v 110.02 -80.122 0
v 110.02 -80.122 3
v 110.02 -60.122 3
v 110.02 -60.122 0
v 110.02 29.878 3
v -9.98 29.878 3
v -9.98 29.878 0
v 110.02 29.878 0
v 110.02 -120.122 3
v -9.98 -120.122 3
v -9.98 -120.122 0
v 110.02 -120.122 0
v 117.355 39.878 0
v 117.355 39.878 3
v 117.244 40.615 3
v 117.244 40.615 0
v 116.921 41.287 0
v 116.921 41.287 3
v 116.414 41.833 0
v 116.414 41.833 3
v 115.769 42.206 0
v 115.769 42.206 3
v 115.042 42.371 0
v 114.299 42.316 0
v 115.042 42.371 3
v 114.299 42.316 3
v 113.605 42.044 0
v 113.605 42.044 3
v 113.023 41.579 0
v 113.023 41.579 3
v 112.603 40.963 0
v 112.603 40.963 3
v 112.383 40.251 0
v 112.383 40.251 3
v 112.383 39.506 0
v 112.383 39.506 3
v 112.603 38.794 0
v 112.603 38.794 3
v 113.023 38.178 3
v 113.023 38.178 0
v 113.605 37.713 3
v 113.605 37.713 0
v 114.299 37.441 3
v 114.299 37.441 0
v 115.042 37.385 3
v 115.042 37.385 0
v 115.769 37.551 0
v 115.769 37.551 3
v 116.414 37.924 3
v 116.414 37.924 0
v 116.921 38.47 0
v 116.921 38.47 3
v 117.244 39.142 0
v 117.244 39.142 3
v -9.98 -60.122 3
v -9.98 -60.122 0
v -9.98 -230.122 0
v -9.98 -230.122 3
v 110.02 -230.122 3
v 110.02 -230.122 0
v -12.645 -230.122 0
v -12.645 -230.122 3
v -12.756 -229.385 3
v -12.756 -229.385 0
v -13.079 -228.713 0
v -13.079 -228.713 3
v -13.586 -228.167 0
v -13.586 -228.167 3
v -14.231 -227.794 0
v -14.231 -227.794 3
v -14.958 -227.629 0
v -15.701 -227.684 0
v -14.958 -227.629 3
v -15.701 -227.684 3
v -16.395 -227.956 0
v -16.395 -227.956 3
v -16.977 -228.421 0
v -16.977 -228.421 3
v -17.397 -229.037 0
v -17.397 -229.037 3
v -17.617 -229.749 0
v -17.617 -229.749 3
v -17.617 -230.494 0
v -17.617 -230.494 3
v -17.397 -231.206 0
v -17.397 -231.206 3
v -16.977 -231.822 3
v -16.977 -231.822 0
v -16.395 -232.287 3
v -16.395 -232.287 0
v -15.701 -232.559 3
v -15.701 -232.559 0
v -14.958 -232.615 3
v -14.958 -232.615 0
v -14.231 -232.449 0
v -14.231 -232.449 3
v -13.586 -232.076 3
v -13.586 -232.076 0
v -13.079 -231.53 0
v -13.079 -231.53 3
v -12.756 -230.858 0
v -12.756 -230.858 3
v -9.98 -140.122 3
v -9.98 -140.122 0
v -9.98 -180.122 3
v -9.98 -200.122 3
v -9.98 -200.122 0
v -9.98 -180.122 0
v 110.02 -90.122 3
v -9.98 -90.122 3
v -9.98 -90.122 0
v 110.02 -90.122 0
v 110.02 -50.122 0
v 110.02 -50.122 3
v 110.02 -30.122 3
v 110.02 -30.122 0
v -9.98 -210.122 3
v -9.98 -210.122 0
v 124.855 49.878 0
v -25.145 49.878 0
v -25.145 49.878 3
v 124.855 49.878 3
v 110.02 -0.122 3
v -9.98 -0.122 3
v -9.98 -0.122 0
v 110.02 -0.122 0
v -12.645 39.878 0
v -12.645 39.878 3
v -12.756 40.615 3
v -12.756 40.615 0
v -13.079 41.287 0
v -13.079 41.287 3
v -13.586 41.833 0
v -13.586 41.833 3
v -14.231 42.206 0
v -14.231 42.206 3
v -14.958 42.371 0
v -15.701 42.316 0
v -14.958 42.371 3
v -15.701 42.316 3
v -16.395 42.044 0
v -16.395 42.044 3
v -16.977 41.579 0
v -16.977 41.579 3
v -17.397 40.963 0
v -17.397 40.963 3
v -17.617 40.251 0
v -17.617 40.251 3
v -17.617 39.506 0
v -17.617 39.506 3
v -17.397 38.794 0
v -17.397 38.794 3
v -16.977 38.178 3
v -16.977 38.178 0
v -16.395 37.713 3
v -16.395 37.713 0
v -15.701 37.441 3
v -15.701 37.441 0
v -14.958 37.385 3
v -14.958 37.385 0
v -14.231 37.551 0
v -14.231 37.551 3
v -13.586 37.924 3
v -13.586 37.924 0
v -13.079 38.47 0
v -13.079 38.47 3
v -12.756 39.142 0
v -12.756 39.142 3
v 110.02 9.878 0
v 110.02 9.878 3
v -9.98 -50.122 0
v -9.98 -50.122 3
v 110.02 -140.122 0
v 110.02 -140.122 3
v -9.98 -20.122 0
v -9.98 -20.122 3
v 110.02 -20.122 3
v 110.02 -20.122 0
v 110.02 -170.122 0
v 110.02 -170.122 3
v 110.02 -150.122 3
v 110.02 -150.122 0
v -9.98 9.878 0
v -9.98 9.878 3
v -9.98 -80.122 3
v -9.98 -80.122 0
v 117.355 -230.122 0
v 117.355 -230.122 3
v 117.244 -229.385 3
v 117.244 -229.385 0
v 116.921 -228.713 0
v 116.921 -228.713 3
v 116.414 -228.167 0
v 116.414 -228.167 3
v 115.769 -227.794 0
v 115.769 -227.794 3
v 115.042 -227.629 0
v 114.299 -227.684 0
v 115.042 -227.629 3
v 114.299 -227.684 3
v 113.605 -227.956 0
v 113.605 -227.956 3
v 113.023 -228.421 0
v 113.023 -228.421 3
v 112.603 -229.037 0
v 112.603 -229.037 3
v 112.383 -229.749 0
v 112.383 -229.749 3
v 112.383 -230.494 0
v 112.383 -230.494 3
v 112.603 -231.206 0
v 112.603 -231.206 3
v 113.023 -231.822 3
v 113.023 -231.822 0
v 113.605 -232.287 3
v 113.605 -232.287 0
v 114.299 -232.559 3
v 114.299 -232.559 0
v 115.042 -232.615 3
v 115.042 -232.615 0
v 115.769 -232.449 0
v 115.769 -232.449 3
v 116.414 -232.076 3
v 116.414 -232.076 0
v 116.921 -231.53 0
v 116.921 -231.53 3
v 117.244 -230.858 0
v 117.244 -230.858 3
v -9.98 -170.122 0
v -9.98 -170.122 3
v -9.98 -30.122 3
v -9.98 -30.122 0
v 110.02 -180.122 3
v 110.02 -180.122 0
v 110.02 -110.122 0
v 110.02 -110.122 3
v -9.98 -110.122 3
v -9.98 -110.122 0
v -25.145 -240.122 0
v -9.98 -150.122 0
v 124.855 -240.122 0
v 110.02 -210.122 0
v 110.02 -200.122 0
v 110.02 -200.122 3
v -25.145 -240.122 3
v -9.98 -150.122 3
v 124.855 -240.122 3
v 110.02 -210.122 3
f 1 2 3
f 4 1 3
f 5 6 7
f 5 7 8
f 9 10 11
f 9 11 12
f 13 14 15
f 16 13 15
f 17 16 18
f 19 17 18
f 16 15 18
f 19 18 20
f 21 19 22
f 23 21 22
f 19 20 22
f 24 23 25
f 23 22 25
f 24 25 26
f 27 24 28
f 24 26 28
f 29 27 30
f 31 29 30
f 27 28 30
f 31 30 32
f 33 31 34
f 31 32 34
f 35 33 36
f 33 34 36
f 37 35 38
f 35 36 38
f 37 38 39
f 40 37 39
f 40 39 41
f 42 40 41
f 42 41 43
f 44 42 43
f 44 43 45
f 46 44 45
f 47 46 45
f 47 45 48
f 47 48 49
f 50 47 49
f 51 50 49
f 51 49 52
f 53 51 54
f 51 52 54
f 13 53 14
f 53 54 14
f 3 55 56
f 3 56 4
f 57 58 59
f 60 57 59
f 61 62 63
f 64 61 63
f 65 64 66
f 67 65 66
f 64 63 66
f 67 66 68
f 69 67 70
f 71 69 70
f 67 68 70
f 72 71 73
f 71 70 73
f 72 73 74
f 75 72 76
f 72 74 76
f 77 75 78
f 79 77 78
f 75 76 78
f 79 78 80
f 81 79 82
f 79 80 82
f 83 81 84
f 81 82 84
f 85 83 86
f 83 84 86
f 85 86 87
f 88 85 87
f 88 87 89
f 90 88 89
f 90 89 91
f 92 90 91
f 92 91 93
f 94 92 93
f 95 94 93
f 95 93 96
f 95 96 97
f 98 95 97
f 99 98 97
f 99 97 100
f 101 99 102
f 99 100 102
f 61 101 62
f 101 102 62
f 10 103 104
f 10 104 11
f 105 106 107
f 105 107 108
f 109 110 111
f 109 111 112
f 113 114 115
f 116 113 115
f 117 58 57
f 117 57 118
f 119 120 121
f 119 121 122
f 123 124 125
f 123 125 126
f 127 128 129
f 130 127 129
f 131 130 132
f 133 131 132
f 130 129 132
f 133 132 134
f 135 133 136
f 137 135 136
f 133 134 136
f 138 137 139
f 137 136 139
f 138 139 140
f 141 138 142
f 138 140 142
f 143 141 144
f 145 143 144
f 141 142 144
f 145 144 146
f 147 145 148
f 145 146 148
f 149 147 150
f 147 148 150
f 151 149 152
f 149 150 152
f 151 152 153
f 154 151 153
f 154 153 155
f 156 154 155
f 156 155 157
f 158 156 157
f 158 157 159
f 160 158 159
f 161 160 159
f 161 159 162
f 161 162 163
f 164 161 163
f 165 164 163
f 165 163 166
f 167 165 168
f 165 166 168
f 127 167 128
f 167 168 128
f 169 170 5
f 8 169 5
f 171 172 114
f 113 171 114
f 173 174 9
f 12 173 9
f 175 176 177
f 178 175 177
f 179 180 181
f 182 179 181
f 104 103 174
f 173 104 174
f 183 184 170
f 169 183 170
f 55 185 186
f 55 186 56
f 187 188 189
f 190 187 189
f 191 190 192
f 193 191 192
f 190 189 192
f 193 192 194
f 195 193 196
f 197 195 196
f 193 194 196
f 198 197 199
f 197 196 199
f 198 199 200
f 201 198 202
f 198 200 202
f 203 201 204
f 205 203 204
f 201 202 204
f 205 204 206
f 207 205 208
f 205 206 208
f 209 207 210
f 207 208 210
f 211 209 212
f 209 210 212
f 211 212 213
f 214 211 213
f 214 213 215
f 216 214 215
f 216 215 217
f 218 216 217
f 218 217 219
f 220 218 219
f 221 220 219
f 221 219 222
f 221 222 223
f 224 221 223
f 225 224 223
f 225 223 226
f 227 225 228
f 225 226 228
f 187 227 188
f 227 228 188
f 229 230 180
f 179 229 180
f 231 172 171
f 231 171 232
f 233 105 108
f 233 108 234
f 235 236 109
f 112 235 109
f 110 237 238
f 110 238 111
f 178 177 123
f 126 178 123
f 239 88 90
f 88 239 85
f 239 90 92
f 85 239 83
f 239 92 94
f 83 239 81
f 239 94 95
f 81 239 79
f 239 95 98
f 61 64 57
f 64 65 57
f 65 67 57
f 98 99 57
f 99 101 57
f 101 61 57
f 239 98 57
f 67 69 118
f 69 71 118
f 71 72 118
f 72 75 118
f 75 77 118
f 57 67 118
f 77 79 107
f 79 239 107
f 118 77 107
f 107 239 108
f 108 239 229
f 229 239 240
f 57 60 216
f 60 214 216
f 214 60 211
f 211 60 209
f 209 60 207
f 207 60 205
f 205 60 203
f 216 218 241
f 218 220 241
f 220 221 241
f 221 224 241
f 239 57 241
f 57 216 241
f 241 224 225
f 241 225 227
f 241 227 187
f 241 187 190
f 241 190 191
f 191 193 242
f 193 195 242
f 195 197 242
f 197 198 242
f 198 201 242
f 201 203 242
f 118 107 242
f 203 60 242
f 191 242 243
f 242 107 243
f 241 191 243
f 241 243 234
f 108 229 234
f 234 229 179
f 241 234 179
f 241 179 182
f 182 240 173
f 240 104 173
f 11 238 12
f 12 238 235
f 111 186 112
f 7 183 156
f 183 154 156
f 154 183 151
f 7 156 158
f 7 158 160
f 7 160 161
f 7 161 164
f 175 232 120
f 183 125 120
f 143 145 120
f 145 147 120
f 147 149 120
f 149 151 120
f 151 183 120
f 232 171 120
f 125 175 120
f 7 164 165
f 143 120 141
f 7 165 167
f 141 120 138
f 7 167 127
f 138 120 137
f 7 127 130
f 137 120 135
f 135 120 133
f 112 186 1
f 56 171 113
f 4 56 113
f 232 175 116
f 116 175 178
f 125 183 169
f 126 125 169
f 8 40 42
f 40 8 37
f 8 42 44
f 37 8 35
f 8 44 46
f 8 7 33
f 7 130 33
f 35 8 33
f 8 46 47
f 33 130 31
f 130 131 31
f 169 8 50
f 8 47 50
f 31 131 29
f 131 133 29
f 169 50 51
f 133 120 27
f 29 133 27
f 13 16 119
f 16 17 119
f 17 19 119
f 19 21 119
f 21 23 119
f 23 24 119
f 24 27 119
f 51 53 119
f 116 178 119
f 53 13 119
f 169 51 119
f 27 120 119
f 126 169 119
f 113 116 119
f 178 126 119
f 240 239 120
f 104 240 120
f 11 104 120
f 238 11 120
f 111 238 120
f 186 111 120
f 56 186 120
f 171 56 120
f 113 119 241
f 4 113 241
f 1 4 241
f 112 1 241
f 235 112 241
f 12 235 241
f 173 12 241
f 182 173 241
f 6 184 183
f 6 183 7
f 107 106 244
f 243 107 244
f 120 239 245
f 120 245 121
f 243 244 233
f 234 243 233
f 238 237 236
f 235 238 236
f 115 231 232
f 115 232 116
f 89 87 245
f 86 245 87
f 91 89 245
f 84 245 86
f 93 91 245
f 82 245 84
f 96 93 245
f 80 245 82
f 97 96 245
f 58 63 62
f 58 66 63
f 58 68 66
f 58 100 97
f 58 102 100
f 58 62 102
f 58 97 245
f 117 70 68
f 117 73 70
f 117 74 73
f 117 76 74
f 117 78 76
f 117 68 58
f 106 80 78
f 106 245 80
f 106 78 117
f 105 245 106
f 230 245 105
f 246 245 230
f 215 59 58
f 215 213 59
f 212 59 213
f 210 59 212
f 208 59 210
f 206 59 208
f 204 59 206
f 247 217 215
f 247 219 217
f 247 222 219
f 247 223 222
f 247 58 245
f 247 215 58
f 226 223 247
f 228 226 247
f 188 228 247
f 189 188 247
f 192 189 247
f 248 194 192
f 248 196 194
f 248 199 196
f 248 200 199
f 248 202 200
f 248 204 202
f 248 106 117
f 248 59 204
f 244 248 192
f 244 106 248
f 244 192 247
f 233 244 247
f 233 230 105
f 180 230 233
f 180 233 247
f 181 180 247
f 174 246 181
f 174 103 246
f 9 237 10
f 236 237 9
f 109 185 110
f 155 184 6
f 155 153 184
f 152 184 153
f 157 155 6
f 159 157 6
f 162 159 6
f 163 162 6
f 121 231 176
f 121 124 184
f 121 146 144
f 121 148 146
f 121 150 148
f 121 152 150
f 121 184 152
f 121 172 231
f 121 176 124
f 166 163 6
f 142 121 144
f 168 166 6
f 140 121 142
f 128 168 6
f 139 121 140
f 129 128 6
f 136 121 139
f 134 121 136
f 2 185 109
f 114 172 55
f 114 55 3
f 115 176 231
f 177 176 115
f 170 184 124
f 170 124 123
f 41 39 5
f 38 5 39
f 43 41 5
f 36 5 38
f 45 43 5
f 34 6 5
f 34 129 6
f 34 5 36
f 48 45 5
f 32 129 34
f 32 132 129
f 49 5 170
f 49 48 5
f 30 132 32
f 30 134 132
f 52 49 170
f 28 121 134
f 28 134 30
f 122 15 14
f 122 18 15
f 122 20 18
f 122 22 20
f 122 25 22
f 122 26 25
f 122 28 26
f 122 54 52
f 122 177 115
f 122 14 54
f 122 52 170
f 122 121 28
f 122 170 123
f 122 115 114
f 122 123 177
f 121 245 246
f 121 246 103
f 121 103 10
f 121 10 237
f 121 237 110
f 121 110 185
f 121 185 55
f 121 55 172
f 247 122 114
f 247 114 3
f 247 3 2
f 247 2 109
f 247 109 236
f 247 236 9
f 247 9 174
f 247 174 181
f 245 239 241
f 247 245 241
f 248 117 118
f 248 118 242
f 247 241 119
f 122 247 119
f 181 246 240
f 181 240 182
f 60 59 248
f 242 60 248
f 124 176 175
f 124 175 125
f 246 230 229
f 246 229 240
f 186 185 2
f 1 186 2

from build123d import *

# Parameters (mm, degrees)
SKETCH_1_W             = 150
SKETCH_1_H             = 290
EXTRUDE_1_DEPTH        = 3
SKETCH_2_R             = 2.5
CUT_EXTRUDE_1_DEPTH    = 3
SKETCH_3_W             = 120
SKETCH_3_H             = 20
CUT_EXTRUDE_2_DEPTH    = 3
PATTERN_LINEAR_1_COUNT = 9
PATTERN_LINEAR_1_PITCH = 30


with BuildPart() as part:
    # 草图1 → 凸台-拉伸1 (new body)
    with BuildSketch(Plane.XY):
        with Locations((49.855231415, -95.12154255)):
            Rectangle(SKETCH_1_W, SKETCH_1_H)
    extrude(amount=EXTRUDE_1_DEPTH)

    # 草图2 → 切除-拉伸1 (cut)
    with BuildSketch(Plane.XY.offset(3)):
        with Locations((114.855231415, 39.87845745)):
            Circle(SKETCH_2_R)
        with Locations((114.855231415, -230.12154255)):
            Circle(SKETCH_2_R)
        with Locations((-15.144768585, 39.87845745)):
            Circle(SKETCH_2_R)
        with Locations((-15.144768585, -230.12154255)):
            Circle(SKETCH_2_R)
    extrude(amount=-CUT_EXTRUDE_1_DEPTH, mode=Mode.SUBTRACT)

    # 草图3 → 切除-拉伸2 (cut)
    with BuildSketch(Plane.XY.offset(3)):
        with Locations((50.020248586, 19.87845745)):
            Rectangle(SKETCH_3_W, SKETCH_3_H)
    cut_extrude_2 = extrude(amount=-CUT_EXTRUDE_2_DEPTH, mode=Mode.SUBTRACT)

    # 阵列(线性)1: 切除-拉伸2 ×9
    with Locations(*[(0, -i * PATTERN_LINEAR_1_PITCH, 0) for i in range(1, PATTERN_LINEAR_1_COUNT)]):
        add(cut_extrude_2, mode=Mode.SUBTRACT)


solid = part.part
